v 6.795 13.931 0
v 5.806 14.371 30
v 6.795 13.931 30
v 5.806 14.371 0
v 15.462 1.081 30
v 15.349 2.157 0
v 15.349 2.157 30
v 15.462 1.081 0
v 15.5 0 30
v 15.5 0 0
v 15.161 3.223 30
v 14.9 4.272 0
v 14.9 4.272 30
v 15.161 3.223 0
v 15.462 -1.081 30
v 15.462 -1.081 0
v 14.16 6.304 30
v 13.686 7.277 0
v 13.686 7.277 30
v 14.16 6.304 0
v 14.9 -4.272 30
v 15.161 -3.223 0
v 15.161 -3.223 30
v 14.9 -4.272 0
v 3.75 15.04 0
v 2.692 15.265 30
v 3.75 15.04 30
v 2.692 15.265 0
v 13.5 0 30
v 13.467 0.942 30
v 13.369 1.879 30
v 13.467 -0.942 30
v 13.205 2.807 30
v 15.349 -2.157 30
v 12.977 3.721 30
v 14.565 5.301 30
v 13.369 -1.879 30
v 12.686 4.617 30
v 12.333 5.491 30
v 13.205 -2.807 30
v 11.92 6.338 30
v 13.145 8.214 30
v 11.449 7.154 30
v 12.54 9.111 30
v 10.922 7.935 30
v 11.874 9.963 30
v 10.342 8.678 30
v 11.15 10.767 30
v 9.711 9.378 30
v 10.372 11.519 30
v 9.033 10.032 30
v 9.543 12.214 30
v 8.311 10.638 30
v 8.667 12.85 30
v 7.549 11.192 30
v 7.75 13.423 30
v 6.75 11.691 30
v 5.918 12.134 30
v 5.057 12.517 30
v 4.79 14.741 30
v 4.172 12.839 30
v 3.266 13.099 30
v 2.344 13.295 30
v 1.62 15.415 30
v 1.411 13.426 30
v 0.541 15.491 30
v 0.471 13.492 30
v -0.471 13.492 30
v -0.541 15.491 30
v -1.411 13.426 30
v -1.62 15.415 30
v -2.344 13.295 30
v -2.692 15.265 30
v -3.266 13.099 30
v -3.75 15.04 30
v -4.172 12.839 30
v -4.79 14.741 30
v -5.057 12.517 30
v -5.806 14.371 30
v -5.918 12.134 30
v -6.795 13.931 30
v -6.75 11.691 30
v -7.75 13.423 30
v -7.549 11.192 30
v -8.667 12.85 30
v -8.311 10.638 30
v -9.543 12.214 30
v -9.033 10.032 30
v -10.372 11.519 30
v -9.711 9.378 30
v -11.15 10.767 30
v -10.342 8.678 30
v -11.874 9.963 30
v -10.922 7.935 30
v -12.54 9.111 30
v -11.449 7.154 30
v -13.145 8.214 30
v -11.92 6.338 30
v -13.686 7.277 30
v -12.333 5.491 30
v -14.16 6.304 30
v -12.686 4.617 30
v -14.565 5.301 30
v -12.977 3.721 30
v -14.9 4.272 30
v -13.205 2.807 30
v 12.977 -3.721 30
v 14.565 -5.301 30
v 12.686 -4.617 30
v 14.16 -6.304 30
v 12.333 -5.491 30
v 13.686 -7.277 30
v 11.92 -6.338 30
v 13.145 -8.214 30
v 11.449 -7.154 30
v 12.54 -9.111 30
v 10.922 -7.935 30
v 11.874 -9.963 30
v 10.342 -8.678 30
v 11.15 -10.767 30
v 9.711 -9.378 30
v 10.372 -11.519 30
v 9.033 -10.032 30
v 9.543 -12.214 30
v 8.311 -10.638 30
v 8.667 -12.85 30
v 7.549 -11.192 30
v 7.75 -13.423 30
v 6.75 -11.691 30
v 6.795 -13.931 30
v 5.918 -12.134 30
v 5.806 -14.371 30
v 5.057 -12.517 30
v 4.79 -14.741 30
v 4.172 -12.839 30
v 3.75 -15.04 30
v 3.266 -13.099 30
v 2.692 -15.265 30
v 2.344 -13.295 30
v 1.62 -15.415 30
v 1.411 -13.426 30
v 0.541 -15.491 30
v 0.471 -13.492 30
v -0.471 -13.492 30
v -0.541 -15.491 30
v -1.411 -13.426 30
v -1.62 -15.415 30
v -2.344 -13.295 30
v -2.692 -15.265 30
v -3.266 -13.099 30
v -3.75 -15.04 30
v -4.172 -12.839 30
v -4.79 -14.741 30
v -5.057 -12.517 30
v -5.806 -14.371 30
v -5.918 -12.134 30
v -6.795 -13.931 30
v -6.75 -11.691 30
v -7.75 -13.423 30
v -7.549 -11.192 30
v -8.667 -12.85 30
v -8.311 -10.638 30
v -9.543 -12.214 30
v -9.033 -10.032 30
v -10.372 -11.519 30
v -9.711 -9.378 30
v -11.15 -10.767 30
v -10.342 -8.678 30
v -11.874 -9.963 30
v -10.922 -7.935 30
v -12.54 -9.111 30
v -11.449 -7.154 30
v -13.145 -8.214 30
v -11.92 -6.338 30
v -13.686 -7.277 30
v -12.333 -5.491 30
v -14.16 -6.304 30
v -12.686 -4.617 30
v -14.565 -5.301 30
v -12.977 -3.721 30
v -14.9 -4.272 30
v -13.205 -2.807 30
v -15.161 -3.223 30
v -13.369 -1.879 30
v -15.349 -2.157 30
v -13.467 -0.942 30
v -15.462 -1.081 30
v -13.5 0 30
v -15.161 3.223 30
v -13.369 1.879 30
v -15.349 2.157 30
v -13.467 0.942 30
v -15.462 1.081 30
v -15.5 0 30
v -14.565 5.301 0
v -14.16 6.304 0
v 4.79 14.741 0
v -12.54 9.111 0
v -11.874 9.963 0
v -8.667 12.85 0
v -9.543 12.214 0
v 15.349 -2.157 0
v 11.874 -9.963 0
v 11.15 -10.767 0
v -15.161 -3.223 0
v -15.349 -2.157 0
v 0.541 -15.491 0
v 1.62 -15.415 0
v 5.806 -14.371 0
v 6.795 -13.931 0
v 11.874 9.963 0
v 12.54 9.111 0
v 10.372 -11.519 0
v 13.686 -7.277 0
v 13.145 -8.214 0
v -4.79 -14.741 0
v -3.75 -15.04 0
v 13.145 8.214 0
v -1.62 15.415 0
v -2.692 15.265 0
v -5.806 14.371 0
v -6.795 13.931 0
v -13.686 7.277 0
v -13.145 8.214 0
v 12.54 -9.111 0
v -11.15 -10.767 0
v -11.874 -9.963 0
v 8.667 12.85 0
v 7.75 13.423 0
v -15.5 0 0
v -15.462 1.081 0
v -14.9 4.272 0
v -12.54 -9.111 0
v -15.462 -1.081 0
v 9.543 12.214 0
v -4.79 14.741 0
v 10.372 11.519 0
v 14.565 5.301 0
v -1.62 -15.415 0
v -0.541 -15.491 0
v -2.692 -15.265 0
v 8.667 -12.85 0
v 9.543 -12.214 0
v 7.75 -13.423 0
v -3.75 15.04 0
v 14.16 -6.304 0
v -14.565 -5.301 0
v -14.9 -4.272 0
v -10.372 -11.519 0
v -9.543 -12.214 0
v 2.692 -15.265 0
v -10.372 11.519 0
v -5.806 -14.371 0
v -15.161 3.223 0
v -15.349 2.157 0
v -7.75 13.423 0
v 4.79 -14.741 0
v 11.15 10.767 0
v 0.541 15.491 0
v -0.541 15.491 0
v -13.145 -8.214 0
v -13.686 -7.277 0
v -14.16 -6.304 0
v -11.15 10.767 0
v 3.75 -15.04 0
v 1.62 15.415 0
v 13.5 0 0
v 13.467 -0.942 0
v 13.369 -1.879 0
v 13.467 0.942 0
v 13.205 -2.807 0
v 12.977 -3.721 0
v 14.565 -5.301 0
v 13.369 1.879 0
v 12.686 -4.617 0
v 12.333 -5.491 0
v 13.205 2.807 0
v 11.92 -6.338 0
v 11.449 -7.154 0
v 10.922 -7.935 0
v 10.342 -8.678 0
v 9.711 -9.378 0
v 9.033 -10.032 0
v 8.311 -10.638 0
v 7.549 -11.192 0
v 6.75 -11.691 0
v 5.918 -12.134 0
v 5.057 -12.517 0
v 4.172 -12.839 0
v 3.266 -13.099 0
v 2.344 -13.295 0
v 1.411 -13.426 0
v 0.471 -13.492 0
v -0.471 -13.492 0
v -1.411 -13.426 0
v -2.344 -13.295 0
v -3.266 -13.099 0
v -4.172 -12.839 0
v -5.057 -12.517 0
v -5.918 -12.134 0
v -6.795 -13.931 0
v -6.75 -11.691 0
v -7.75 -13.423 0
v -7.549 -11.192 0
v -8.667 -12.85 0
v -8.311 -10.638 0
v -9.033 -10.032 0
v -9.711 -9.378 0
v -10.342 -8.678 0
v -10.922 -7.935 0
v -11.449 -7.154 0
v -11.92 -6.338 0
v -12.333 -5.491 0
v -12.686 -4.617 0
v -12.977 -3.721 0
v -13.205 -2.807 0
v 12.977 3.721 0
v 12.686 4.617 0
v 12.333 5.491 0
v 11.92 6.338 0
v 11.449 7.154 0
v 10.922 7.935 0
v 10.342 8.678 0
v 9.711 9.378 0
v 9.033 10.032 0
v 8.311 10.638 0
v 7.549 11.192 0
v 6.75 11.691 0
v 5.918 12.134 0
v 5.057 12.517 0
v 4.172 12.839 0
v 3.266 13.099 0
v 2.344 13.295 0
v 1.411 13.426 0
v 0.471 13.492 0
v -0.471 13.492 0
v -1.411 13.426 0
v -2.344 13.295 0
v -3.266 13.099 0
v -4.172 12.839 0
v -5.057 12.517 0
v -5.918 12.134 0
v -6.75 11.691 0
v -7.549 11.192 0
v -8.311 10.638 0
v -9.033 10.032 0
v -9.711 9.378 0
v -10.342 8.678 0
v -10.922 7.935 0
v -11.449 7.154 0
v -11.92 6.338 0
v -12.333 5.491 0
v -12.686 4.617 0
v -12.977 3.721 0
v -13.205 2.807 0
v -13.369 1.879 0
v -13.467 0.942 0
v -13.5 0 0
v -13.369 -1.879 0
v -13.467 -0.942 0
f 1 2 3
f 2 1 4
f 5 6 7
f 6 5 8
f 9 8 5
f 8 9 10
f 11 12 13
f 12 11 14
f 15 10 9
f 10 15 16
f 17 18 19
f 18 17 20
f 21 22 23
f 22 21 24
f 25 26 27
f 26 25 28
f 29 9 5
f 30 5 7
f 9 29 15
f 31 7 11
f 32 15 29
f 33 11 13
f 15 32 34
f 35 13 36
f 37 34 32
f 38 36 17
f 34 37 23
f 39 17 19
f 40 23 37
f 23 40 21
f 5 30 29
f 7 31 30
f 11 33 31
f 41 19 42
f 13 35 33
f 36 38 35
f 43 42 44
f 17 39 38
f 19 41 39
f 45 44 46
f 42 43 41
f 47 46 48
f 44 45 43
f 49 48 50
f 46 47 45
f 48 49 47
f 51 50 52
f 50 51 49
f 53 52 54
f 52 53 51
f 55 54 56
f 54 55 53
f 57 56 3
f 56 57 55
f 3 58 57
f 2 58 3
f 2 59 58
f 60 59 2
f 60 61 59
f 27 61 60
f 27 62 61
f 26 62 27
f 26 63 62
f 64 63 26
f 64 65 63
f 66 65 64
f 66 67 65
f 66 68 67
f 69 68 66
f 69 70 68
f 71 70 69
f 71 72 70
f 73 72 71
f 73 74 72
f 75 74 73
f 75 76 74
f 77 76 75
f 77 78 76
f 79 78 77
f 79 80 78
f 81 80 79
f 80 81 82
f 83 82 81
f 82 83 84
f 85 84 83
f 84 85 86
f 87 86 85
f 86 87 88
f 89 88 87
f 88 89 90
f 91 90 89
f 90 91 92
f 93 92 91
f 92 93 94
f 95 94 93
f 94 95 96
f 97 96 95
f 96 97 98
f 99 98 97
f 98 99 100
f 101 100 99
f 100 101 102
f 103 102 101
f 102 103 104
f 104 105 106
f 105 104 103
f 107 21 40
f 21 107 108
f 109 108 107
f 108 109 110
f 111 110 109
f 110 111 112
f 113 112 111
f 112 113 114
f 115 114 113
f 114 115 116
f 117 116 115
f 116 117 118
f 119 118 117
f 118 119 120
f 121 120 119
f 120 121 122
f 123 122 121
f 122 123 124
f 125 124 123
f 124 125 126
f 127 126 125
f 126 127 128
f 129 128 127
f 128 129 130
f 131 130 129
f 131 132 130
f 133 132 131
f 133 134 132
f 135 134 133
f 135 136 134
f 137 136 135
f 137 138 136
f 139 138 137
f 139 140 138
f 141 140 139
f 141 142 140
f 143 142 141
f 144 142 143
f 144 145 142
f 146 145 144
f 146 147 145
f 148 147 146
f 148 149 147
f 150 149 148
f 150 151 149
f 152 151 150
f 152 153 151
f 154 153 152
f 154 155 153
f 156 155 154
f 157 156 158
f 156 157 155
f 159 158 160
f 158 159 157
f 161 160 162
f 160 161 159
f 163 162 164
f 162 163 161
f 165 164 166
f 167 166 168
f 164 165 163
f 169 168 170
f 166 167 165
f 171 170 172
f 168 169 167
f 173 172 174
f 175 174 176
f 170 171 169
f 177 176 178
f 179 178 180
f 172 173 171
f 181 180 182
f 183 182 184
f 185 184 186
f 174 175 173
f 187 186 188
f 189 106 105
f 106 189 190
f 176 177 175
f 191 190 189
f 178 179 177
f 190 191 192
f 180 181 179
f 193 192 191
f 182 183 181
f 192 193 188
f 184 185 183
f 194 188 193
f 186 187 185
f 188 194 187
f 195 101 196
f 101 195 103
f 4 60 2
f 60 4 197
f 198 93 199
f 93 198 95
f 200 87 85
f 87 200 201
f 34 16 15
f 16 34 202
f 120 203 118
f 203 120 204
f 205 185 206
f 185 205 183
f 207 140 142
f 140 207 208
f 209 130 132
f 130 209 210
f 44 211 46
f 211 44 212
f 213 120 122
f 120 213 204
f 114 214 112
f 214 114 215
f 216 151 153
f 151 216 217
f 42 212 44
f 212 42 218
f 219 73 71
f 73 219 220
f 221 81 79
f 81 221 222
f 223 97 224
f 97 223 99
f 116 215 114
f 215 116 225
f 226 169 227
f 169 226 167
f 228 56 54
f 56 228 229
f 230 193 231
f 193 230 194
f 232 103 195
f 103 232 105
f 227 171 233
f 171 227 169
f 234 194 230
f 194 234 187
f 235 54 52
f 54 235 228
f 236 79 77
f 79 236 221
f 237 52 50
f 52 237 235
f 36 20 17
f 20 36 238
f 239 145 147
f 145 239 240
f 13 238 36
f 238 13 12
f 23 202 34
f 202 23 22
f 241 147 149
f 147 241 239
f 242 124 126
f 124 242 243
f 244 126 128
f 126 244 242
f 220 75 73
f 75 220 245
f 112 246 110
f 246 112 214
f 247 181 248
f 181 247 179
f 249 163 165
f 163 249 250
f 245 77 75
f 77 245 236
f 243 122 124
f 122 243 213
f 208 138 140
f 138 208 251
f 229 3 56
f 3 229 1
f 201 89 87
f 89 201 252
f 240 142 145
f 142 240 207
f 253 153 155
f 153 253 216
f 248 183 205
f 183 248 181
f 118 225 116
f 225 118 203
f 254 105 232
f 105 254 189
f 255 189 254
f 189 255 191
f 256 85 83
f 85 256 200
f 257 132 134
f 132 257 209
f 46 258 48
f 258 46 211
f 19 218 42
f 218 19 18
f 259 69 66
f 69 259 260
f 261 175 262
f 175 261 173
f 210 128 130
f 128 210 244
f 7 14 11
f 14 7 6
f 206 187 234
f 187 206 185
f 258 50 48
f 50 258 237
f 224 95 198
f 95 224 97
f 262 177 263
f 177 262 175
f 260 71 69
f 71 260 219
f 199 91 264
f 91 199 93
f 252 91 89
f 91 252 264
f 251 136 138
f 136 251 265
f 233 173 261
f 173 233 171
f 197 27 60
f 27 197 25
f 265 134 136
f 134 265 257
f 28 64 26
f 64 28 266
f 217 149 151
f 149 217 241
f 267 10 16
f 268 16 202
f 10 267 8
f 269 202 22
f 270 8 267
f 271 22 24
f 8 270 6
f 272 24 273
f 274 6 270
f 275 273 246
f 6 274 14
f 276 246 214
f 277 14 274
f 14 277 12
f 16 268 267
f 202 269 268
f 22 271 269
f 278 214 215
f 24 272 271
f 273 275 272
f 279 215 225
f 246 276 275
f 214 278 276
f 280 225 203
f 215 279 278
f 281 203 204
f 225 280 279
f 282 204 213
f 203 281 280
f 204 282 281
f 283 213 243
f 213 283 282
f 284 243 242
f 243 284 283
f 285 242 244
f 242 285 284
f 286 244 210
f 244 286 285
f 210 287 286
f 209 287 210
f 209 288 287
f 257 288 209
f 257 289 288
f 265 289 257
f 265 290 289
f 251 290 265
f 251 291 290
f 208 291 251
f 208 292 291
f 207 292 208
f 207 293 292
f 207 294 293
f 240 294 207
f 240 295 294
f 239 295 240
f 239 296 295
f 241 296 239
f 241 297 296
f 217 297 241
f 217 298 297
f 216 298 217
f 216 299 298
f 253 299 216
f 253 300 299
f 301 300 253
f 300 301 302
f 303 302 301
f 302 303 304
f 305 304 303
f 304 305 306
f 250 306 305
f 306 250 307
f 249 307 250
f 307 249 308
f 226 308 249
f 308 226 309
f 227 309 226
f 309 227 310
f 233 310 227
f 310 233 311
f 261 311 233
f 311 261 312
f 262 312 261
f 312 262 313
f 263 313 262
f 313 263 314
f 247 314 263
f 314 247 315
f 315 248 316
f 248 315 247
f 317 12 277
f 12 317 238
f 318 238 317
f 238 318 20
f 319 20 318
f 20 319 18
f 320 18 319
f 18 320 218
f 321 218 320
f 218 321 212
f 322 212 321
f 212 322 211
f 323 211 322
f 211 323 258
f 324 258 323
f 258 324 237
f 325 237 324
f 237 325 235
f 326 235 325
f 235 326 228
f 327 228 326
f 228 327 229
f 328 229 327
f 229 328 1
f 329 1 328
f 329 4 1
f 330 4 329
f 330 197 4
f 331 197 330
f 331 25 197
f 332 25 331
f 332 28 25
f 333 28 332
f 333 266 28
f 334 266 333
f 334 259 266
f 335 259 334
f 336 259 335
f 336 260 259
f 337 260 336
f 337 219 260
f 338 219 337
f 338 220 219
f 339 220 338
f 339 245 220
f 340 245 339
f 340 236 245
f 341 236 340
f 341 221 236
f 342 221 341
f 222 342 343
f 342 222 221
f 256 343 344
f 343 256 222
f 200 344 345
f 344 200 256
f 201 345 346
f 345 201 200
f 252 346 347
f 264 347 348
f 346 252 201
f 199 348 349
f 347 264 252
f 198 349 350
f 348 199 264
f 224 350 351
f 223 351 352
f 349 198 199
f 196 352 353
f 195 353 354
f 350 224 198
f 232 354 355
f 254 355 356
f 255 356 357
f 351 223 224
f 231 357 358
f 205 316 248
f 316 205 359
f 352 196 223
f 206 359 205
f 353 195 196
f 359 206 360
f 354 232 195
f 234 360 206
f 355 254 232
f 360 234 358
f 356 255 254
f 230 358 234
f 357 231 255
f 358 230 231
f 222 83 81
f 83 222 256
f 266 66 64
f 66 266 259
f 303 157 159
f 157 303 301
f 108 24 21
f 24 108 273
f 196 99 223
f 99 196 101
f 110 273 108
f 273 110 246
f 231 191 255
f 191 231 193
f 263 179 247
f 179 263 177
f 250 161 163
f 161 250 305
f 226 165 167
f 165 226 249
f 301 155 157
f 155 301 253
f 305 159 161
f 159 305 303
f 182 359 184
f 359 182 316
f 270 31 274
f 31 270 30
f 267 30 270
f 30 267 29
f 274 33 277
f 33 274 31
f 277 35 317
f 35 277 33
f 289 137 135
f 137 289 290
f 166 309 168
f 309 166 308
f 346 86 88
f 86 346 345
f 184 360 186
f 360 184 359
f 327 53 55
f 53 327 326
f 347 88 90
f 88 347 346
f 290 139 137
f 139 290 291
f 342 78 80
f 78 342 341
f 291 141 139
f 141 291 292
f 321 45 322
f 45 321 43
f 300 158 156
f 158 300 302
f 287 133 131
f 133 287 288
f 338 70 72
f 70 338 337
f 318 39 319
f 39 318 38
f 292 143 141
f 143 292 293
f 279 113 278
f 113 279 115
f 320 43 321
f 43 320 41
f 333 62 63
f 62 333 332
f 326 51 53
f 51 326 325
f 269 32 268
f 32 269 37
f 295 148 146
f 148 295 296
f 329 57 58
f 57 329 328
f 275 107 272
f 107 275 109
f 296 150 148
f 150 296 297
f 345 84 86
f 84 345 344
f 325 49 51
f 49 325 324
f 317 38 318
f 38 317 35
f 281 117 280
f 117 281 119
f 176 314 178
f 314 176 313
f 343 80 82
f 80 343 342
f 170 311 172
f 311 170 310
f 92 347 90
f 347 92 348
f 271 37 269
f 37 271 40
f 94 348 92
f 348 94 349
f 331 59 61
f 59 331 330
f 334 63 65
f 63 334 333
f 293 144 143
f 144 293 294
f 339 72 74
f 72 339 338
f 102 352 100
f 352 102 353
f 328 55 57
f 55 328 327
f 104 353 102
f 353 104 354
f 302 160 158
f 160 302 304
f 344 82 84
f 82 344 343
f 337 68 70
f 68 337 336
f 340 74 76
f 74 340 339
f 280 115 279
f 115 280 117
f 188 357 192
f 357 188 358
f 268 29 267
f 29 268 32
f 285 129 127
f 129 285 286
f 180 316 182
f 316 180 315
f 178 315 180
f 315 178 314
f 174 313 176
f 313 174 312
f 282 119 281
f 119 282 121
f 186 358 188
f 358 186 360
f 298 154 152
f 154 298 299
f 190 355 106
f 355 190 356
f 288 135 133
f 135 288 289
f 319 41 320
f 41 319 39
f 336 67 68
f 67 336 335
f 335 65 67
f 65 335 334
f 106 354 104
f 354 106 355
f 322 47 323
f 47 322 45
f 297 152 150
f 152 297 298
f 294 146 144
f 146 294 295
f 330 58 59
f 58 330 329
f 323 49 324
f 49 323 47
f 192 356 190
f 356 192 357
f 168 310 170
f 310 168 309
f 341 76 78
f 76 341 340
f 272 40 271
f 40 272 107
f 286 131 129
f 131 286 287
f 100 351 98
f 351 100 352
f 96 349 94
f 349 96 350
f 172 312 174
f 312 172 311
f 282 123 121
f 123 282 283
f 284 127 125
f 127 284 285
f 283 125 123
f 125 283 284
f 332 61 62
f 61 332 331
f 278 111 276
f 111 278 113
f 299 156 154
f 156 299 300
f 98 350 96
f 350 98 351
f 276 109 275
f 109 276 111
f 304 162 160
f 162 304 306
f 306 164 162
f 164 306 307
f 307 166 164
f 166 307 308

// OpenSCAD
// file: dim.scad
M_TRANSITION		= 114;
M_LED_HOLDER_FRONT	= M_TRANSITION + 48;
M_LED_HOLDER_BACK	= M_LED_HOLDER_FRONT - 10;
M_SWITCH_CENTER		= M_TRANSITION + 30.5;
M_FORWARD_PCB       = M_TRANSITION + 20;
M_PORT_CENTER       = M_TRANSITION + 14;

M_SPKR_RING			= 15.5;		// Front of the speaker ring.
M_RAIL_START        = 12;
M_POMMEL_FRONT      = 10;       // Where the pommel becomes aft
M_POMMEL_BACK       = 9.0;      // Back of the pommel, leaving (in this case)
                                // enough space for the various pommels.
M_0                 = 0;

H_BUTTRESS			= 4;

M_BUTTRESS_0		= M_SPKR_RING + H_BUTTRESS;			// speaker holder, behind wings
M_BUTTRESS_3		= M_SPKR_RING + H_BUTTRESS + 59;
M_BUTTRESS_4		= M_SPKR_RING + 70;		// holds speaker in place, space for foam

M_WAY_BACK			= -20;
H_FAR				= 200;

MM_TO_INCHES = 1 / 25.4;
INCHES_TO_MM = 25.4;

D_FORWARD			= 25.4;
R_FORWARD 			= D_FORWARD / 2;
D_AFT				= 32.5;
R_AFT 				= D_AFT / 2;
T_TRANSITION_RING	= 4;

Y_SWITCH			= 9.6;
D_SWITCH			= 12.5;
D_SWITCH_TOP		= 14.5;
D_PORT 				= 12.7;		// FIXME
D_SMALL_PORT		= 7.9;

D_SABER_OUTER		= 37.5;

H_BATTERY           = 68;
BATTERY_BIAS        = 0.5;  // downward bias to fit it tape / protector
D_BATTERY           = 18.50 + 0.5;    // An 1850. Huh. 
R_BATTERY			= D_BATTERY / 2;

H_SPKR_PLASTIC 		= 2.3;
D_SPKR_PLASTIC 		= 28 + 1;
SPKR_OFFSET         = 1.5;    // distance from FRONT of pommel to speaker
D_SPKR_INNER 		= D_SPKR_PLASTIC - 1.5;

D_POMMEL			= 31.0; // 31.5 is correct, but snug
R_POMMEL 			= D_POMMEL / 2;
D_AFT_RING			= 33.5;

RAIL_ANGLE_0		=  25; //38;
RAIL_ANGLE_1		= -18; //-38;
RAIL_ANGLE_2		=  180 - RAIL_ANGLE_0;
RAIL_ANGLE_3		= -180 - RAIL_ANGLE_1;

X_RAIL				= 3;
Y_RAIL				= 4;

W_WING  			= 25;
H_WING  			= 10.5;	// higher over power converter

W_MC 				= 18;
MC_RAIL             = 2.8;
RAIL_DY             = -13;
H_MC    			= 10;
Y_MC    			= -15.5;	// low config -13.5, this value in flat config
Z_MC_35 			= 71.5;		// includes SD
SHOULDER_DX			= 2.5;
SHOULDER_DZ			= 3.5;

HORN_WIDTH			= 5;
HORN_BASE_WIDTH		= 6.5;

BEAM_WIDTH          = 5.0;
BEAM_HEIGHT         = 8.0;

M_RF24				= 95;	// fixme
RF24_PUNCH_X0		= 10;
RF24_PUNCH_X1		= 15;
RF24_PUNCH_Y		= 1;	// fixme
RF24_PUNCH_DY		= 8.61;
RF24_T				= 3;	// fixme
RF24_OUTER_T		= 5;

// Battery
// 68mm
//   - 4 front holder
//   - 4 rear holder
//   - 2 slop
// 58mm, 2.28in
// main file
include <dim.scad>

$fn = 90;
H = 30;

difference() {
    cylinder(h=H, d=D_POMMEL);
    cylinder(h=H, d=D_SPKR_PLASTIC - 2);
}
